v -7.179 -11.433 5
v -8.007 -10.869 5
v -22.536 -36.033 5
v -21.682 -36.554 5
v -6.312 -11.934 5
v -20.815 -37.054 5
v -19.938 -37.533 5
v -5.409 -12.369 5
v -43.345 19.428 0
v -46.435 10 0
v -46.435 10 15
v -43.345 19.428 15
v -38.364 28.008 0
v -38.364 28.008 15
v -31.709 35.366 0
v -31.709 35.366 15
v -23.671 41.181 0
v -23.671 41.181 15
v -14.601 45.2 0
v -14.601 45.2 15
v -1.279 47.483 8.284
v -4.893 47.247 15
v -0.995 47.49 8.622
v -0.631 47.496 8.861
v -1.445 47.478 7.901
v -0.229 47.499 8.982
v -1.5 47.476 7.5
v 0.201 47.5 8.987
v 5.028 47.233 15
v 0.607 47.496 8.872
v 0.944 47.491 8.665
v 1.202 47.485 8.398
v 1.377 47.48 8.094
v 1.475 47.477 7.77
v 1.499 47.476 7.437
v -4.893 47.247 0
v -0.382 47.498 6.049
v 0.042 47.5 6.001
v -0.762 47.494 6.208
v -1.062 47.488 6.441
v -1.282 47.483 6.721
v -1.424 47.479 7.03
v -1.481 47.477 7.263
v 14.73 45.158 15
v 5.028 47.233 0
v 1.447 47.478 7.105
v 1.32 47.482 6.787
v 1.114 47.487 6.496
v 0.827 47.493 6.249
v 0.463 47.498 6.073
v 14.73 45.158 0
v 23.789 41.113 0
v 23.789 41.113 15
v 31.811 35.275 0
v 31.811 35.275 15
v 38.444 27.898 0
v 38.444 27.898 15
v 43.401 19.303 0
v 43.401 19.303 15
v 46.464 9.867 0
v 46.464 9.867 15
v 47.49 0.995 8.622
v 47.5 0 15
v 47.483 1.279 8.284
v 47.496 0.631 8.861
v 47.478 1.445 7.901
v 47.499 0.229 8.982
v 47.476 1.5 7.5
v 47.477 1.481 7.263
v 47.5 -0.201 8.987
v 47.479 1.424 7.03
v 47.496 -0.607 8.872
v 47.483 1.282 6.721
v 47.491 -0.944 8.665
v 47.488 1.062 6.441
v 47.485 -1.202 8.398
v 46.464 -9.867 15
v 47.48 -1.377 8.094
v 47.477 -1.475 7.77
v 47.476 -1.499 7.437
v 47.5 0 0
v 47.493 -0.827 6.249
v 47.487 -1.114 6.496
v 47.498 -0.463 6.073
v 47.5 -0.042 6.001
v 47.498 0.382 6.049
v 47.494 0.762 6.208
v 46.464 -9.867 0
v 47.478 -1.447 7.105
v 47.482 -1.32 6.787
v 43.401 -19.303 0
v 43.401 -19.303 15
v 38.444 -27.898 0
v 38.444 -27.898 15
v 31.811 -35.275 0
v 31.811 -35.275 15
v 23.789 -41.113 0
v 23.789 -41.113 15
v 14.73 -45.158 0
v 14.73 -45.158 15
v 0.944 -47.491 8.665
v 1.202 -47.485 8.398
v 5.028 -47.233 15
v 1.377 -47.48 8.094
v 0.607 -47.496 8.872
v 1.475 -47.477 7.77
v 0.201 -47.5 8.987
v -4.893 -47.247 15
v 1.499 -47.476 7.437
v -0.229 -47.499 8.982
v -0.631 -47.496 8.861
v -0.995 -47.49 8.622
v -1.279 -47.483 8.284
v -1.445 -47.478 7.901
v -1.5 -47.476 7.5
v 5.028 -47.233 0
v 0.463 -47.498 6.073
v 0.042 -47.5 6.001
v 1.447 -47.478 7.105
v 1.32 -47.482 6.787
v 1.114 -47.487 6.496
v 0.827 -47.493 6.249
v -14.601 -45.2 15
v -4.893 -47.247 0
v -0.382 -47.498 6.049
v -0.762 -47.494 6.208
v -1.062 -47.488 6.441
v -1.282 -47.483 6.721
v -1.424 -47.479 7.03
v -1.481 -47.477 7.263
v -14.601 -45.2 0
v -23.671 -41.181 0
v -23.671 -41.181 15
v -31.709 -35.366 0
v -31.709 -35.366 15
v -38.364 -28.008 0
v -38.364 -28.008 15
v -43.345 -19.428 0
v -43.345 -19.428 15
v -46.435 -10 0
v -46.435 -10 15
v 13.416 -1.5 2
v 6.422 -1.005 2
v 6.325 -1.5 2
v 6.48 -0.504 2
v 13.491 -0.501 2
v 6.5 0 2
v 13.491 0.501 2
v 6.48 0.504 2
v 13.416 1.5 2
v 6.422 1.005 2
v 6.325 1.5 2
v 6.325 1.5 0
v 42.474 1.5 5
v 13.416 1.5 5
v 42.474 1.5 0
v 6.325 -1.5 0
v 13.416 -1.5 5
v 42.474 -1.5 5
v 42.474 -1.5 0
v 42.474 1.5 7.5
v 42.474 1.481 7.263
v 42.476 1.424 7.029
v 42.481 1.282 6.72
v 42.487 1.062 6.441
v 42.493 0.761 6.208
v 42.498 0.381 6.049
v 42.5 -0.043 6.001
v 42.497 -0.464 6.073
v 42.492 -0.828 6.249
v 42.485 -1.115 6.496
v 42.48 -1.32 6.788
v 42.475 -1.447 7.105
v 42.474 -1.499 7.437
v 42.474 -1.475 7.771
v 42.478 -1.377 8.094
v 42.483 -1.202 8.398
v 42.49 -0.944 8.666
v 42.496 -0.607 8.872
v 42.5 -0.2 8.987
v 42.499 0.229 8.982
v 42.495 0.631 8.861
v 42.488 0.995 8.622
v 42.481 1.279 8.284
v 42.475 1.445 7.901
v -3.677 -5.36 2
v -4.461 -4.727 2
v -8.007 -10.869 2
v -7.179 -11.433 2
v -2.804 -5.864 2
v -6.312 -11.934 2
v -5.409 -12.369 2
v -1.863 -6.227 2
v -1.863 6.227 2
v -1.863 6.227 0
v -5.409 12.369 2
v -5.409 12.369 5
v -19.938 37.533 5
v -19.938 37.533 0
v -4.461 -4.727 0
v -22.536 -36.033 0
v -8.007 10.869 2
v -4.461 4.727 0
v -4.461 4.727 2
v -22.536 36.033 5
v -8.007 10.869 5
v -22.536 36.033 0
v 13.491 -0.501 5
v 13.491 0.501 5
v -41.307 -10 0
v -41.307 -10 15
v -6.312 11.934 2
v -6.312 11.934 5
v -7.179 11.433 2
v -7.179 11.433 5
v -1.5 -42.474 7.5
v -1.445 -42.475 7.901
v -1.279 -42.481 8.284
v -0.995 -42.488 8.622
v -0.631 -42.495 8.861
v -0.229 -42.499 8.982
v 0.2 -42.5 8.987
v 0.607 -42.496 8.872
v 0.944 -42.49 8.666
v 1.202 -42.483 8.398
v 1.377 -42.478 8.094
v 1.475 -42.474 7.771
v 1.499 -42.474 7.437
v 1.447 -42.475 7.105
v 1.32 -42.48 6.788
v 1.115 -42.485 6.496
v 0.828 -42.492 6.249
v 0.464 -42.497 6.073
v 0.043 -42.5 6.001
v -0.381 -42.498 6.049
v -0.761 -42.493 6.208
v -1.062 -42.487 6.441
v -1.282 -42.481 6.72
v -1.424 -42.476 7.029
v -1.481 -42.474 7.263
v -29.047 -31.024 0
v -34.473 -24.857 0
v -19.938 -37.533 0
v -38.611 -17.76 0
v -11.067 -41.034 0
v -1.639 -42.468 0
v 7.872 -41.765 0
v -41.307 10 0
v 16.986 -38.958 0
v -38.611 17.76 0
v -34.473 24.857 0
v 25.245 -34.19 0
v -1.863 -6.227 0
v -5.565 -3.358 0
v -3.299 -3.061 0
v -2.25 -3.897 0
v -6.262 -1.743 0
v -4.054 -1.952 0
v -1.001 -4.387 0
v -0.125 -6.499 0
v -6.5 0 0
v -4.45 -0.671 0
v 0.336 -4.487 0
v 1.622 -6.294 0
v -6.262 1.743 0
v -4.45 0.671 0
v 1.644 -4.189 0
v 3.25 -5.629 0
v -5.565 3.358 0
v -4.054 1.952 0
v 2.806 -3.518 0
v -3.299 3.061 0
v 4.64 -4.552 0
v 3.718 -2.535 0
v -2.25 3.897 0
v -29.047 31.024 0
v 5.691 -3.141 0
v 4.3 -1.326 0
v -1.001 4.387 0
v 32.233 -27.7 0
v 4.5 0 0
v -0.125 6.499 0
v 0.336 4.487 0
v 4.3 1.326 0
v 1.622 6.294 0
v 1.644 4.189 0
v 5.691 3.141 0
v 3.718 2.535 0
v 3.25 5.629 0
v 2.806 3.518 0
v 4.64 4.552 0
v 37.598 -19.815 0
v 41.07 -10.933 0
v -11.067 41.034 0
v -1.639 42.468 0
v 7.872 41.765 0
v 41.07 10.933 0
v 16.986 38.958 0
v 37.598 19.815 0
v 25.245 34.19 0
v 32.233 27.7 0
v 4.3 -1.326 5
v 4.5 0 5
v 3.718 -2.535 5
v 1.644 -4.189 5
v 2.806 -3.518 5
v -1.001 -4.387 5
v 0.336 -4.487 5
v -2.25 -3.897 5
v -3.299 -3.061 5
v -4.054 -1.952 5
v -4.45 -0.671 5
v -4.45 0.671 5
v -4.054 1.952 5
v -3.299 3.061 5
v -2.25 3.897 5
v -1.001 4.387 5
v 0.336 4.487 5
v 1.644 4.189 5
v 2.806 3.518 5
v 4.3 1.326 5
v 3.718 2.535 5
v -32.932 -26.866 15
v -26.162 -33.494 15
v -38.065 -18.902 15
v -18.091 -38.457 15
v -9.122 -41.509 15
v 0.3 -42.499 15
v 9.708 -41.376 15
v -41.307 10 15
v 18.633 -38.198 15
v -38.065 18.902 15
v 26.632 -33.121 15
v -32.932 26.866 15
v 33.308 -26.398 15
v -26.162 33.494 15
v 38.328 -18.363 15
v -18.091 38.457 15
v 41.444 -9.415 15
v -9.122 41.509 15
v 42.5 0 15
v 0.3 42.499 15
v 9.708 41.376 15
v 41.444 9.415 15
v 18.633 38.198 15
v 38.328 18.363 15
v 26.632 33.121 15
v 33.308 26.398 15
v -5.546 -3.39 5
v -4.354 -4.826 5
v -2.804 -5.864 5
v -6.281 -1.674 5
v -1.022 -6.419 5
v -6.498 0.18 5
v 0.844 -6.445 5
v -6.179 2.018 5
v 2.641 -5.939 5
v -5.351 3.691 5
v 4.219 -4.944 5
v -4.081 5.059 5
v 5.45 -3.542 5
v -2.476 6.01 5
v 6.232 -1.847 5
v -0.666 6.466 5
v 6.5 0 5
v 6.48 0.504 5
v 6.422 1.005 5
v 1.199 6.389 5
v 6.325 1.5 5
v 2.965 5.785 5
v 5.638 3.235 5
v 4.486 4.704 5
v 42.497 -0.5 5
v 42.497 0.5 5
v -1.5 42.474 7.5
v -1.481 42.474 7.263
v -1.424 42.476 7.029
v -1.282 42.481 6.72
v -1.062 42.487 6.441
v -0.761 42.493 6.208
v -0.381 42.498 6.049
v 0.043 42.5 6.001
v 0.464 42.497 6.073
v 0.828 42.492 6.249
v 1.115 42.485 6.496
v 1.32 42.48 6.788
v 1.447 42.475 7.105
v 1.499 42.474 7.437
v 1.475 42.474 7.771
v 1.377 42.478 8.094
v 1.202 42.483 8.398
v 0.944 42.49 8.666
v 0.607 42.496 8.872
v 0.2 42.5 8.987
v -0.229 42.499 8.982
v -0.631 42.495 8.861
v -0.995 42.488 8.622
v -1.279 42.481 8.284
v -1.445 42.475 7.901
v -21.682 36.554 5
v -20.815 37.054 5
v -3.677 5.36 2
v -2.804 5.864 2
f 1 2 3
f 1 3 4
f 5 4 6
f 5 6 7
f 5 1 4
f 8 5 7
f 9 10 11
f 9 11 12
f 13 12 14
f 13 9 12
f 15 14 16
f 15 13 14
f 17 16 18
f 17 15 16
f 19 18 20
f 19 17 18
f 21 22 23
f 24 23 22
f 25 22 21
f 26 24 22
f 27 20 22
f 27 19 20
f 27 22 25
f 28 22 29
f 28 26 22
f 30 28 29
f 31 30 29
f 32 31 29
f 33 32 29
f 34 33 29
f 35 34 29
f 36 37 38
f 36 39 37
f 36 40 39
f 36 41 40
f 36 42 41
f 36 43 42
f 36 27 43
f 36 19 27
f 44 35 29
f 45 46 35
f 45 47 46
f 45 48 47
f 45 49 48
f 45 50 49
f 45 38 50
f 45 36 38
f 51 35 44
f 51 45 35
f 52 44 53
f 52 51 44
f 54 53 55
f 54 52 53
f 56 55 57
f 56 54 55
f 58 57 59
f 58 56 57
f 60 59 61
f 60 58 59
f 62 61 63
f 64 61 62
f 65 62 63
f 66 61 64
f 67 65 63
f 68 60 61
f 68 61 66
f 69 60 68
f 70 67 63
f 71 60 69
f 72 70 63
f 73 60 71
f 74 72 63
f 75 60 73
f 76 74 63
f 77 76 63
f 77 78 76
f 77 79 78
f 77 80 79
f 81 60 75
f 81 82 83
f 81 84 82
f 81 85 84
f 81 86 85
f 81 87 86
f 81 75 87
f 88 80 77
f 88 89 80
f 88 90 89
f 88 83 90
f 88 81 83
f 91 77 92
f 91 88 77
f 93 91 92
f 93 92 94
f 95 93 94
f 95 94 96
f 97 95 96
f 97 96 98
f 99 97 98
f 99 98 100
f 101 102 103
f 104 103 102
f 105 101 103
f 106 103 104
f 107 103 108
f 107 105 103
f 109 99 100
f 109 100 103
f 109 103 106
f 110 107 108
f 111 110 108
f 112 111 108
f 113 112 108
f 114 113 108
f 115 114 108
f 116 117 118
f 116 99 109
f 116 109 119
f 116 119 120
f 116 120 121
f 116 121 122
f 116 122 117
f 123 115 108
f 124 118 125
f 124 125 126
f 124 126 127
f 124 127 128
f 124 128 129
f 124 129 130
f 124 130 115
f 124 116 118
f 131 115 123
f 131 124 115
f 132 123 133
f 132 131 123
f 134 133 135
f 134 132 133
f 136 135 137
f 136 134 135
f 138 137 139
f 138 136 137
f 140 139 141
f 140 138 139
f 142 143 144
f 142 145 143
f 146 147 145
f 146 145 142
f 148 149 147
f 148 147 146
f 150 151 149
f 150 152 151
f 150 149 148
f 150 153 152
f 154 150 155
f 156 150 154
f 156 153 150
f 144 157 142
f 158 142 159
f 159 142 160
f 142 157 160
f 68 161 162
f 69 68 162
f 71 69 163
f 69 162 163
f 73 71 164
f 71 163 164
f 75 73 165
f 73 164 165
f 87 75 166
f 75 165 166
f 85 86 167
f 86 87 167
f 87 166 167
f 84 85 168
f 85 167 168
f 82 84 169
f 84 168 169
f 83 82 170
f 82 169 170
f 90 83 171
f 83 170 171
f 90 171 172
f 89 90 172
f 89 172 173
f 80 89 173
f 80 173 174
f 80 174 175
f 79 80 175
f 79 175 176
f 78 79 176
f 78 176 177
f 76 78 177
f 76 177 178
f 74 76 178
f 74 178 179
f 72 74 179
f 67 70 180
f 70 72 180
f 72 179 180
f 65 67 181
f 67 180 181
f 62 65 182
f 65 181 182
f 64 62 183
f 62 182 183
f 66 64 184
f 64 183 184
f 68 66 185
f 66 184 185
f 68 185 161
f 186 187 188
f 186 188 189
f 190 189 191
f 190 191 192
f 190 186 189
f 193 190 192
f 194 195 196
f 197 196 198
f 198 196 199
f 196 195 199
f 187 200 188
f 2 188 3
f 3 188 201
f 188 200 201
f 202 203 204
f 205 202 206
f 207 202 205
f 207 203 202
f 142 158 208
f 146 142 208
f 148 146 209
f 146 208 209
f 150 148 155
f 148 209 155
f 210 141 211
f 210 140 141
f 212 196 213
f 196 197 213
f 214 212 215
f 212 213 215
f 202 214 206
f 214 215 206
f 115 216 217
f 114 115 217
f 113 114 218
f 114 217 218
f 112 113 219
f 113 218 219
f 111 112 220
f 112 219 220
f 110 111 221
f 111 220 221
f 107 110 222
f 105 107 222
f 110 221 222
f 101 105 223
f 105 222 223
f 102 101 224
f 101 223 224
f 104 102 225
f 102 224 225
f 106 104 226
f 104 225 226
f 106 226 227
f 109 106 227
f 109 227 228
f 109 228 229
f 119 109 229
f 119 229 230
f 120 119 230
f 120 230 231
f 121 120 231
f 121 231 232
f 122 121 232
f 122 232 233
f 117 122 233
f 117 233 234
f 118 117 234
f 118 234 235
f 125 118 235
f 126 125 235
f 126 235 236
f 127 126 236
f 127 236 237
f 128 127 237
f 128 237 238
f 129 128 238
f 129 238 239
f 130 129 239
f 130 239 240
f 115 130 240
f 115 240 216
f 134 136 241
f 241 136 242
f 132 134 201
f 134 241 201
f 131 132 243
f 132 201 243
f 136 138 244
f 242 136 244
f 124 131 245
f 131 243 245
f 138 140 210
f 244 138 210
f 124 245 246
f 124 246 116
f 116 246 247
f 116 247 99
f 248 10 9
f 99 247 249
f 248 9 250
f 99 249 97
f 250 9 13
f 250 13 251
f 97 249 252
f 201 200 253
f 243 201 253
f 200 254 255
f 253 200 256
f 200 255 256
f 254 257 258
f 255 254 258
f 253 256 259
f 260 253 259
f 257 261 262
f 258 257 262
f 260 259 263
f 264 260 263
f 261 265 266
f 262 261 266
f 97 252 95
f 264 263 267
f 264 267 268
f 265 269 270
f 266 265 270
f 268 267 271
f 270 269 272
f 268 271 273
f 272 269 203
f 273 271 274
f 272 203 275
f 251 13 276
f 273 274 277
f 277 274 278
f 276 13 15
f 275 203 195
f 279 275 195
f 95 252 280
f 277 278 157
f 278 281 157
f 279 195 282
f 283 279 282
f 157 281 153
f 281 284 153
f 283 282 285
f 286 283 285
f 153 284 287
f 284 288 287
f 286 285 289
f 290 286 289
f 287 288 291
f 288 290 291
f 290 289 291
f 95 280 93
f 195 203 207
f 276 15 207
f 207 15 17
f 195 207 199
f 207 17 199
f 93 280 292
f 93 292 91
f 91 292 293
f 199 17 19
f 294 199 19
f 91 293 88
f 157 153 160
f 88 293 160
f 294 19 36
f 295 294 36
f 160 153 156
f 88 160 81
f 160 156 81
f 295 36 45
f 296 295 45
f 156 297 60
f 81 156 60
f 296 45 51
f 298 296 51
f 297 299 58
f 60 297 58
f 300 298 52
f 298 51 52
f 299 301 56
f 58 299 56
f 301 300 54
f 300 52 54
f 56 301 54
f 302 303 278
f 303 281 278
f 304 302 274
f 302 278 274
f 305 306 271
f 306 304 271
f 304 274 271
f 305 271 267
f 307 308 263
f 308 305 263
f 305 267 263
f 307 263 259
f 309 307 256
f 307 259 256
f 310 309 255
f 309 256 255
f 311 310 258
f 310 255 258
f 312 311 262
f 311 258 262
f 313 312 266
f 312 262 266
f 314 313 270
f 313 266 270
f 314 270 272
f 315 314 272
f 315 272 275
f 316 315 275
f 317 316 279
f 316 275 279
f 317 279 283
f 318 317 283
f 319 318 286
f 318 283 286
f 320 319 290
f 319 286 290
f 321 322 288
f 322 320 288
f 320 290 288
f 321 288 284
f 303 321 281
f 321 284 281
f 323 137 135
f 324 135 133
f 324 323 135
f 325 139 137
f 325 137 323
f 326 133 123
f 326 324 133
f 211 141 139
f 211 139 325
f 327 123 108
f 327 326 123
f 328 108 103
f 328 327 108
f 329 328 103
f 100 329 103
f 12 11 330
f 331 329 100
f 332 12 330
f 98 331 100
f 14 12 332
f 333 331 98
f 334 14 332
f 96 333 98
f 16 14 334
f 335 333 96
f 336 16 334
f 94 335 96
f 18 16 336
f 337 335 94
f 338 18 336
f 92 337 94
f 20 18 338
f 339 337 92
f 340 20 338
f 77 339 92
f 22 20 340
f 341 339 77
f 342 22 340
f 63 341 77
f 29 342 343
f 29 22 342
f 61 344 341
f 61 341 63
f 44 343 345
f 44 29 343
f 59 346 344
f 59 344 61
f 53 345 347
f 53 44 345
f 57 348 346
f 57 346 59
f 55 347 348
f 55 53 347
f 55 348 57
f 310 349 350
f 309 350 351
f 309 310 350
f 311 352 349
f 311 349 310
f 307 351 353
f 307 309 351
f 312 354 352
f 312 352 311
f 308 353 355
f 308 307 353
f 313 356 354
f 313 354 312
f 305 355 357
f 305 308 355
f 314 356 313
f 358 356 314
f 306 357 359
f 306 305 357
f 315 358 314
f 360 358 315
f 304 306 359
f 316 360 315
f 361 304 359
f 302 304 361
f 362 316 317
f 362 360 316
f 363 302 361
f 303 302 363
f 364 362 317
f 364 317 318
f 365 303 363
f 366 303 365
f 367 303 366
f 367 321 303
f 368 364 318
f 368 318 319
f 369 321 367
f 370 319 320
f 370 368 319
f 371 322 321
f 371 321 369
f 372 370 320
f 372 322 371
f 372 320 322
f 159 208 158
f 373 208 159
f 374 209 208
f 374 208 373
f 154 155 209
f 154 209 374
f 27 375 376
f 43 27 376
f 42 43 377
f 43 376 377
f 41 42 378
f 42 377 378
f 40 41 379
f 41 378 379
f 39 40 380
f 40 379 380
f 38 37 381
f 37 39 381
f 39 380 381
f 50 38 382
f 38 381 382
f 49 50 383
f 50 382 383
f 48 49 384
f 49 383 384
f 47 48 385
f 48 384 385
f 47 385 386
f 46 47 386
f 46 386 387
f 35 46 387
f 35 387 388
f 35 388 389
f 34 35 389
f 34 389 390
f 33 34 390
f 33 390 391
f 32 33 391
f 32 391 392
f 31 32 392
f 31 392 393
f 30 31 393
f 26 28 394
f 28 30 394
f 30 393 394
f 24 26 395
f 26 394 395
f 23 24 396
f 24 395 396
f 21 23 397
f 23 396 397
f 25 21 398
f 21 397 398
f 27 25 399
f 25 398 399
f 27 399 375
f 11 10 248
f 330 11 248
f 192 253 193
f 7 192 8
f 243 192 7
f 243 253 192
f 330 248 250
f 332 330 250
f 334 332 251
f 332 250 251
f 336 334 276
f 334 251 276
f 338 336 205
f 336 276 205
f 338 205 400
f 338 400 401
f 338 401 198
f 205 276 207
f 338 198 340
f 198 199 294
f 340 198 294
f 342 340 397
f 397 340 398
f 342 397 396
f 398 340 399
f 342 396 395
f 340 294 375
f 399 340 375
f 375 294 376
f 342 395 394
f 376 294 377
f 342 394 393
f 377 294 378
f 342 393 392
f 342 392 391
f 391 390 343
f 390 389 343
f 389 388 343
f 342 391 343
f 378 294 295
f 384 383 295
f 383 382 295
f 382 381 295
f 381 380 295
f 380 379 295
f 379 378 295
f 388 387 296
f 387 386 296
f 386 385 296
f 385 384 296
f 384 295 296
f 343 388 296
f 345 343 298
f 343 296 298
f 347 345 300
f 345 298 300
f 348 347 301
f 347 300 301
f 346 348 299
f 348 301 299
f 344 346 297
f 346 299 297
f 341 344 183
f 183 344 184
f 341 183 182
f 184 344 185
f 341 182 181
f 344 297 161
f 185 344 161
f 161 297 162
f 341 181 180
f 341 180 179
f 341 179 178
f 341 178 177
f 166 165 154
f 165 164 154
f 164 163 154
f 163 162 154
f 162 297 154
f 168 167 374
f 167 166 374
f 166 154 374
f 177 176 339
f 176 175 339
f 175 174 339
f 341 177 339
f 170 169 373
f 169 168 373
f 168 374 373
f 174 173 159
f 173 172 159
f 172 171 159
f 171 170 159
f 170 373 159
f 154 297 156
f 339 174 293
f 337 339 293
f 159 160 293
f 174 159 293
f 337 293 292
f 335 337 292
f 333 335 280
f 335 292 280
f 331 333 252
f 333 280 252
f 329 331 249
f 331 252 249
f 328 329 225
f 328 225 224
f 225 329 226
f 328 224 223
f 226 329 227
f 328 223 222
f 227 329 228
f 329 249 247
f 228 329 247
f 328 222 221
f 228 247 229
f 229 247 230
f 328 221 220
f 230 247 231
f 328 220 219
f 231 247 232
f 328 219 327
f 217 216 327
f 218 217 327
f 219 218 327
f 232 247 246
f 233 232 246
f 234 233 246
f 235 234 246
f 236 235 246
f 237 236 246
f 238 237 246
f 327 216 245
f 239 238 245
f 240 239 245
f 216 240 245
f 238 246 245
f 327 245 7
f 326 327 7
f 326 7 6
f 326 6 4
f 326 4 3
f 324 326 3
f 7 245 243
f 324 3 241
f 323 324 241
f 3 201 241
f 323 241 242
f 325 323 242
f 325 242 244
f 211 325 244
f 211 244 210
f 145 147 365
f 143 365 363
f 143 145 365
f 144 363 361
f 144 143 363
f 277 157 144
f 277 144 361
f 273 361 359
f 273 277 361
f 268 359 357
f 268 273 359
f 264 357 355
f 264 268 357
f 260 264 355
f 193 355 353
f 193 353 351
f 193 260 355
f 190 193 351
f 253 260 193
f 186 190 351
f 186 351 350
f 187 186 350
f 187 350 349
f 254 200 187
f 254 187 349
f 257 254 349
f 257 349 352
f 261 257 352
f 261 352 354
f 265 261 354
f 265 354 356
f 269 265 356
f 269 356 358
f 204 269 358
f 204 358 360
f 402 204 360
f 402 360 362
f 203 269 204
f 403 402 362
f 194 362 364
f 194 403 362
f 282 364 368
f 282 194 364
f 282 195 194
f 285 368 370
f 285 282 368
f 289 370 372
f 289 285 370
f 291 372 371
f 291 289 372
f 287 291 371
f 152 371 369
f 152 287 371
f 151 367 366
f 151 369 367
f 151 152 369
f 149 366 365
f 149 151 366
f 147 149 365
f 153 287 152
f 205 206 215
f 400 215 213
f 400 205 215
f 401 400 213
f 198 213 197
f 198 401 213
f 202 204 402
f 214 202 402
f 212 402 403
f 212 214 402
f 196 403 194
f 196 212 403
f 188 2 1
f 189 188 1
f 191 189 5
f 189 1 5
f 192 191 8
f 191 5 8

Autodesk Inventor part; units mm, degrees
ref_plane "YZ Plane" through (0, 0, 0) normal (1, 0, 0) x (0, 1, 0)
ref_plane "XZ Plane" through (0, 0, 0) normal (0, 1, 0) x (-1, 0, 0)
ref_plane "XY Plane" through (0, 0, 0) normal (0, 0, 1) x (1, 0, 0)
sketch "Sketch1" plane through (0, 0, 0) normal (0, 0, 1) x (1, 0, 0)
  circle A0 centre (0, 0) radius 47.5 construction
  line L0 (-46.4354, 10) -> (-46.4354, -10) construction
  circle A1 centre (0, 0) radius 42.5 construction
  line L1 (-46.4354, 10) -> (-41.3068, 10)
  line L2 (-46.4354, -10) -> (-41.3068, -10)
  arc A2 (-46.4354, -10) -> (-46.4354, 10) centre (0, 0) ccw
  arc A3 (-41.3068, -10) -> (-41.3068, 10) centre (0, 0) ccw
  circle A4 centre (0, 0) radius 4.5
  circle A5 centre (0, 0) radius 6.5
  line L3 (4.2426, 1.5) -> (47.4763, 1.5)
  line L4 (4.2426, -1.5) -> (47.4763, -1.5)
  arc A6 (4.2426, -1.5) -> (4.2426, 1.5) centre (0, 0) ccw
  arc A7 (47.4763, -1.5) -> (47.4763, 1.5) centre (0, 0) ccw
  line L5 (-3.4204, 2.9242) -> (-25.0372, 40.3657)
  line L6 (-0.8223, 4.4242) -> (-22.4391, 41.8657)
  line L7 (-0.8223, -4.4242) -> (-22.4391, -41.8657)
  line L8 (-3.4204, -2.9242) -> (-25.0372, -40.3657)
  arc A8 (-0.8223, 4.4242) -> (-3.4204, 2.9242) centre (0, 0) ccw
  arc A9 (-3.4204, -2.9242) -> (-0.8223, -4.4242) centre (0, 0) ccw
  arc A10 (-22.4391, 41.8657) -> (-25.0372, 40.3657) centre (0, 0) ccw
  arc A11 (-25.0372, -40.3657) -> (-22.4391, -41.8657) centre (0, 0) ccw
  point P0 (-46.4354, 0)
  dimension "d0" = 95
  dimension "d1" = 20
  dimension "d2" = 5
  dimension "d5" = 9
  dimension "d7" = 3
  dimension "d10" = 360
  dimension "d17" = 13
extrude "Extrusion1" add sketch "Sketch1" along normal blind 15 contours A2 L5 A3 L1 | A2 L6 A3 L5 | A2 L3 A3 L6 | L5 A4 L8 A5 | A5 L6 A4 L5 | A2 L4 A3 L3 | A5 L3 A4 L6 | L8 A4 L7 A5 | A2 L7 A3 L4 | A5 L4 A4 L3 | L7 A4 L4 A5 | L8 A2 L2 A3 | A3 L7 A2 L8
extrude "Extrusion2" add sketch "Sketch1" along normal blind 5 contours A2 L6 A3 L5 | A3 L6 A5 L5 | A5 L6 A4 L5 | A2 L4 A3 L3 | A3 L4 A5 L3 | L8 A4 L7 A5 | A5 L7 A3 L8 | A5 L4 A4 L3 | A3 L7 A2 L8
sketch "Sketch3" plane through (0, 0, 15) normal (0, 0, 1) x (1, 0, 0)
  circle A0 centre (0, 0) radius 4.5 projected
  circle A1 centre (0, 0) radius 6.5 projected
  point P0 (0, 0)
extrude "Extrusion3" cut sketch "Sketch3" against normal blind 10
sketch "Sketch4" plane through (0, 0, 5) normal (0, 0, 1) x (1, 0, 0)
  arc A0 (6.3246, 1.5) -> (-1.8632, 6.2272) centre (0, 0) ccw projected
  line L0 (42.4735, 1.5) -> (6.3246, 1.5) projected
  circle A1 centre (0, 0) radius 6.5
  circle A2 centre (0, 0) radius 13.5
  point P0 (0, 0)
  dimension "d18" = 27
extrude "Extrusion4" cut sketch "Sketch4" against normal blind 3
sketch "Sketch5" plane through (0, 0, 0) normal (1, 0, 0) x (0, 1, 0)
  line L0 (-10, 0) -> (10, 0) projected
  line L1 (10, 0) -> (10, 15) projected
  line L2 (-10, 15) -> (10, 15) projected
  line L3 (-10, 0) -> (-10, 15) projected
  circle A0 centre (0, 7.5) radius 1.5
  point P0 (0, 0)
  point P1 (-10, 7.5)
  point P2 (0, 0)
  dimension "d21" = 3
extrude "Extrusion5" cut sketch "Sketch5" along normal through all contours A0
sketch "Sketch6" plane through (0, 0, 0) normal (0, 1, 0) x (-1, 0, 0)
  circle A0 centre (0, 7.5) radius 1.5
  point P0 (0, 0)
  dimension "d24" = 3
  dimension "d25" = 7.5
extrude "Extrusion6" cut sketch "Sketch6" along normal through all both and the other way through all
properties part number "AA051" material "ABS Plastic"
